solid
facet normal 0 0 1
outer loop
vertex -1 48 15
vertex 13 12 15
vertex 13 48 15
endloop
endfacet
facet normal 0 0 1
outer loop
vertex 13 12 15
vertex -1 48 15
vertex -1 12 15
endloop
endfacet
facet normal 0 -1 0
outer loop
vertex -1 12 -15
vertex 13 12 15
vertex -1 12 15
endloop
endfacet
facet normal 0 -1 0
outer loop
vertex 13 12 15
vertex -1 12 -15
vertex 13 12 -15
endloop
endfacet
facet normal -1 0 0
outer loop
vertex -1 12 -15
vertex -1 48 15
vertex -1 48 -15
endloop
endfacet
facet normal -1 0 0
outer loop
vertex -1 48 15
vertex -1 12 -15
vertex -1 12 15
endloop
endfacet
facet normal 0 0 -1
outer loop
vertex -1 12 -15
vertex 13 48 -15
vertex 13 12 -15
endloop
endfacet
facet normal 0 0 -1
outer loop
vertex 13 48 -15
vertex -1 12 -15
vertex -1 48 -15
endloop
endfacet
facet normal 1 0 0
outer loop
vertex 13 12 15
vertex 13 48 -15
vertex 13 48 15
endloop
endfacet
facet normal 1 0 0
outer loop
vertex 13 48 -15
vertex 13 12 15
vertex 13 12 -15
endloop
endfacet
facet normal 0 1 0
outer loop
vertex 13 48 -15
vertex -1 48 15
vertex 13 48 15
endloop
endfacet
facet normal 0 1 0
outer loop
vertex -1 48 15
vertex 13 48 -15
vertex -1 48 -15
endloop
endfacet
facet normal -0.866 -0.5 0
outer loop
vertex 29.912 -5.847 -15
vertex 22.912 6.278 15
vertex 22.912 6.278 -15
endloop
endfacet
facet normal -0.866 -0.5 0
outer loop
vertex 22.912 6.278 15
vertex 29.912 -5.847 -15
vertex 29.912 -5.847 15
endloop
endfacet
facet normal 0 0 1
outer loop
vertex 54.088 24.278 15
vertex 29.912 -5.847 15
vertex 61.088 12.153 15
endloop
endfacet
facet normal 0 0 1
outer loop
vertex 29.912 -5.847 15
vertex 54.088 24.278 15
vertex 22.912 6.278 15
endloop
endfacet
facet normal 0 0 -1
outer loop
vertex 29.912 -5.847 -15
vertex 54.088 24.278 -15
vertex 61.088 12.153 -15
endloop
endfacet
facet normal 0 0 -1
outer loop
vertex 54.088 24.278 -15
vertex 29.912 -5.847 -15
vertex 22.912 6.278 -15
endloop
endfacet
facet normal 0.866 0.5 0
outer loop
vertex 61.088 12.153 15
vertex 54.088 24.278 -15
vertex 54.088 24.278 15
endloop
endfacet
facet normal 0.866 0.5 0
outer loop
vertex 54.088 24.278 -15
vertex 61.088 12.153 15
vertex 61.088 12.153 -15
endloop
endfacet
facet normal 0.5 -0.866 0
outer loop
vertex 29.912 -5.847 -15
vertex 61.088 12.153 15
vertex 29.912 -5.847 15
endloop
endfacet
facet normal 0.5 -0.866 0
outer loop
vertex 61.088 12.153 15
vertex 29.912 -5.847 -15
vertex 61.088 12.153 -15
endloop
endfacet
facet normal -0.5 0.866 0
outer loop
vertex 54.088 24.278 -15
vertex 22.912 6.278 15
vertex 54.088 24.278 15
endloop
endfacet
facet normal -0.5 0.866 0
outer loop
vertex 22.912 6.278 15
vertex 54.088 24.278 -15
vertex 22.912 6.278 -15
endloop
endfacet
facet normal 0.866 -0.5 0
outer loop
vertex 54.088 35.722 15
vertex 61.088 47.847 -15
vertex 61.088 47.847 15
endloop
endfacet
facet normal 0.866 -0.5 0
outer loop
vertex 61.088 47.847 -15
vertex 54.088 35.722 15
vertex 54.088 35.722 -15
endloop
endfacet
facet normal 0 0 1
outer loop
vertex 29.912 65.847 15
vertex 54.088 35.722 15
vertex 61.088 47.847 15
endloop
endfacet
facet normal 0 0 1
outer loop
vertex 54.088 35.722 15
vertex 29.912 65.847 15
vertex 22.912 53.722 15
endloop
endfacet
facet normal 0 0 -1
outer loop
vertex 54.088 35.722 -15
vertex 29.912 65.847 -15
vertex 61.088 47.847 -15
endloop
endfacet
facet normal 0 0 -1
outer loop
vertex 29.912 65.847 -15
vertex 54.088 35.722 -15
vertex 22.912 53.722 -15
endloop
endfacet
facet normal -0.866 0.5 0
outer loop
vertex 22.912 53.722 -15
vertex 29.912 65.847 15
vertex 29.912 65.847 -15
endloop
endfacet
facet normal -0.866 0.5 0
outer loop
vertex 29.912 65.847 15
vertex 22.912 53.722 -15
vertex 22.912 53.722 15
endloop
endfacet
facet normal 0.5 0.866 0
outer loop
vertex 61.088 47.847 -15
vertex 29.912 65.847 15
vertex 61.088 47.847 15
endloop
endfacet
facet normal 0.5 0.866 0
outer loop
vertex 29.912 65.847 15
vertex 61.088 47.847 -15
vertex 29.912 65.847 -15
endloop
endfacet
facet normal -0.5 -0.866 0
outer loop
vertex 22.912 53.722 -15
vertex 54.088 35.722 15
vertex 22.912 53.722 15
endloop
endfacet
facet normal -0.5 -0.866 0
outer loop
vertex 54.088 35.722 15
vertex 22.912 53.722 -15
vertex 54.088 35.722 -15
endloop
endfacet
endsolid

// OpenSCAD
// -*- mode: SCAD ; c-file-style: "ellemtel" ; coding: utf-8 -*-
//
// NN
//
// (c) 2017 Roland Sieker <ospalh@gmail.com>
// Licence: CC-BY-SA 4.0


translate([30, 30, 0])
{
for (o=[90:120:360])
{
    rotate(o)
    {
        translate([0,24,0])
        {
            cube([36,14,30], center=true);
        }

    }
}
}
